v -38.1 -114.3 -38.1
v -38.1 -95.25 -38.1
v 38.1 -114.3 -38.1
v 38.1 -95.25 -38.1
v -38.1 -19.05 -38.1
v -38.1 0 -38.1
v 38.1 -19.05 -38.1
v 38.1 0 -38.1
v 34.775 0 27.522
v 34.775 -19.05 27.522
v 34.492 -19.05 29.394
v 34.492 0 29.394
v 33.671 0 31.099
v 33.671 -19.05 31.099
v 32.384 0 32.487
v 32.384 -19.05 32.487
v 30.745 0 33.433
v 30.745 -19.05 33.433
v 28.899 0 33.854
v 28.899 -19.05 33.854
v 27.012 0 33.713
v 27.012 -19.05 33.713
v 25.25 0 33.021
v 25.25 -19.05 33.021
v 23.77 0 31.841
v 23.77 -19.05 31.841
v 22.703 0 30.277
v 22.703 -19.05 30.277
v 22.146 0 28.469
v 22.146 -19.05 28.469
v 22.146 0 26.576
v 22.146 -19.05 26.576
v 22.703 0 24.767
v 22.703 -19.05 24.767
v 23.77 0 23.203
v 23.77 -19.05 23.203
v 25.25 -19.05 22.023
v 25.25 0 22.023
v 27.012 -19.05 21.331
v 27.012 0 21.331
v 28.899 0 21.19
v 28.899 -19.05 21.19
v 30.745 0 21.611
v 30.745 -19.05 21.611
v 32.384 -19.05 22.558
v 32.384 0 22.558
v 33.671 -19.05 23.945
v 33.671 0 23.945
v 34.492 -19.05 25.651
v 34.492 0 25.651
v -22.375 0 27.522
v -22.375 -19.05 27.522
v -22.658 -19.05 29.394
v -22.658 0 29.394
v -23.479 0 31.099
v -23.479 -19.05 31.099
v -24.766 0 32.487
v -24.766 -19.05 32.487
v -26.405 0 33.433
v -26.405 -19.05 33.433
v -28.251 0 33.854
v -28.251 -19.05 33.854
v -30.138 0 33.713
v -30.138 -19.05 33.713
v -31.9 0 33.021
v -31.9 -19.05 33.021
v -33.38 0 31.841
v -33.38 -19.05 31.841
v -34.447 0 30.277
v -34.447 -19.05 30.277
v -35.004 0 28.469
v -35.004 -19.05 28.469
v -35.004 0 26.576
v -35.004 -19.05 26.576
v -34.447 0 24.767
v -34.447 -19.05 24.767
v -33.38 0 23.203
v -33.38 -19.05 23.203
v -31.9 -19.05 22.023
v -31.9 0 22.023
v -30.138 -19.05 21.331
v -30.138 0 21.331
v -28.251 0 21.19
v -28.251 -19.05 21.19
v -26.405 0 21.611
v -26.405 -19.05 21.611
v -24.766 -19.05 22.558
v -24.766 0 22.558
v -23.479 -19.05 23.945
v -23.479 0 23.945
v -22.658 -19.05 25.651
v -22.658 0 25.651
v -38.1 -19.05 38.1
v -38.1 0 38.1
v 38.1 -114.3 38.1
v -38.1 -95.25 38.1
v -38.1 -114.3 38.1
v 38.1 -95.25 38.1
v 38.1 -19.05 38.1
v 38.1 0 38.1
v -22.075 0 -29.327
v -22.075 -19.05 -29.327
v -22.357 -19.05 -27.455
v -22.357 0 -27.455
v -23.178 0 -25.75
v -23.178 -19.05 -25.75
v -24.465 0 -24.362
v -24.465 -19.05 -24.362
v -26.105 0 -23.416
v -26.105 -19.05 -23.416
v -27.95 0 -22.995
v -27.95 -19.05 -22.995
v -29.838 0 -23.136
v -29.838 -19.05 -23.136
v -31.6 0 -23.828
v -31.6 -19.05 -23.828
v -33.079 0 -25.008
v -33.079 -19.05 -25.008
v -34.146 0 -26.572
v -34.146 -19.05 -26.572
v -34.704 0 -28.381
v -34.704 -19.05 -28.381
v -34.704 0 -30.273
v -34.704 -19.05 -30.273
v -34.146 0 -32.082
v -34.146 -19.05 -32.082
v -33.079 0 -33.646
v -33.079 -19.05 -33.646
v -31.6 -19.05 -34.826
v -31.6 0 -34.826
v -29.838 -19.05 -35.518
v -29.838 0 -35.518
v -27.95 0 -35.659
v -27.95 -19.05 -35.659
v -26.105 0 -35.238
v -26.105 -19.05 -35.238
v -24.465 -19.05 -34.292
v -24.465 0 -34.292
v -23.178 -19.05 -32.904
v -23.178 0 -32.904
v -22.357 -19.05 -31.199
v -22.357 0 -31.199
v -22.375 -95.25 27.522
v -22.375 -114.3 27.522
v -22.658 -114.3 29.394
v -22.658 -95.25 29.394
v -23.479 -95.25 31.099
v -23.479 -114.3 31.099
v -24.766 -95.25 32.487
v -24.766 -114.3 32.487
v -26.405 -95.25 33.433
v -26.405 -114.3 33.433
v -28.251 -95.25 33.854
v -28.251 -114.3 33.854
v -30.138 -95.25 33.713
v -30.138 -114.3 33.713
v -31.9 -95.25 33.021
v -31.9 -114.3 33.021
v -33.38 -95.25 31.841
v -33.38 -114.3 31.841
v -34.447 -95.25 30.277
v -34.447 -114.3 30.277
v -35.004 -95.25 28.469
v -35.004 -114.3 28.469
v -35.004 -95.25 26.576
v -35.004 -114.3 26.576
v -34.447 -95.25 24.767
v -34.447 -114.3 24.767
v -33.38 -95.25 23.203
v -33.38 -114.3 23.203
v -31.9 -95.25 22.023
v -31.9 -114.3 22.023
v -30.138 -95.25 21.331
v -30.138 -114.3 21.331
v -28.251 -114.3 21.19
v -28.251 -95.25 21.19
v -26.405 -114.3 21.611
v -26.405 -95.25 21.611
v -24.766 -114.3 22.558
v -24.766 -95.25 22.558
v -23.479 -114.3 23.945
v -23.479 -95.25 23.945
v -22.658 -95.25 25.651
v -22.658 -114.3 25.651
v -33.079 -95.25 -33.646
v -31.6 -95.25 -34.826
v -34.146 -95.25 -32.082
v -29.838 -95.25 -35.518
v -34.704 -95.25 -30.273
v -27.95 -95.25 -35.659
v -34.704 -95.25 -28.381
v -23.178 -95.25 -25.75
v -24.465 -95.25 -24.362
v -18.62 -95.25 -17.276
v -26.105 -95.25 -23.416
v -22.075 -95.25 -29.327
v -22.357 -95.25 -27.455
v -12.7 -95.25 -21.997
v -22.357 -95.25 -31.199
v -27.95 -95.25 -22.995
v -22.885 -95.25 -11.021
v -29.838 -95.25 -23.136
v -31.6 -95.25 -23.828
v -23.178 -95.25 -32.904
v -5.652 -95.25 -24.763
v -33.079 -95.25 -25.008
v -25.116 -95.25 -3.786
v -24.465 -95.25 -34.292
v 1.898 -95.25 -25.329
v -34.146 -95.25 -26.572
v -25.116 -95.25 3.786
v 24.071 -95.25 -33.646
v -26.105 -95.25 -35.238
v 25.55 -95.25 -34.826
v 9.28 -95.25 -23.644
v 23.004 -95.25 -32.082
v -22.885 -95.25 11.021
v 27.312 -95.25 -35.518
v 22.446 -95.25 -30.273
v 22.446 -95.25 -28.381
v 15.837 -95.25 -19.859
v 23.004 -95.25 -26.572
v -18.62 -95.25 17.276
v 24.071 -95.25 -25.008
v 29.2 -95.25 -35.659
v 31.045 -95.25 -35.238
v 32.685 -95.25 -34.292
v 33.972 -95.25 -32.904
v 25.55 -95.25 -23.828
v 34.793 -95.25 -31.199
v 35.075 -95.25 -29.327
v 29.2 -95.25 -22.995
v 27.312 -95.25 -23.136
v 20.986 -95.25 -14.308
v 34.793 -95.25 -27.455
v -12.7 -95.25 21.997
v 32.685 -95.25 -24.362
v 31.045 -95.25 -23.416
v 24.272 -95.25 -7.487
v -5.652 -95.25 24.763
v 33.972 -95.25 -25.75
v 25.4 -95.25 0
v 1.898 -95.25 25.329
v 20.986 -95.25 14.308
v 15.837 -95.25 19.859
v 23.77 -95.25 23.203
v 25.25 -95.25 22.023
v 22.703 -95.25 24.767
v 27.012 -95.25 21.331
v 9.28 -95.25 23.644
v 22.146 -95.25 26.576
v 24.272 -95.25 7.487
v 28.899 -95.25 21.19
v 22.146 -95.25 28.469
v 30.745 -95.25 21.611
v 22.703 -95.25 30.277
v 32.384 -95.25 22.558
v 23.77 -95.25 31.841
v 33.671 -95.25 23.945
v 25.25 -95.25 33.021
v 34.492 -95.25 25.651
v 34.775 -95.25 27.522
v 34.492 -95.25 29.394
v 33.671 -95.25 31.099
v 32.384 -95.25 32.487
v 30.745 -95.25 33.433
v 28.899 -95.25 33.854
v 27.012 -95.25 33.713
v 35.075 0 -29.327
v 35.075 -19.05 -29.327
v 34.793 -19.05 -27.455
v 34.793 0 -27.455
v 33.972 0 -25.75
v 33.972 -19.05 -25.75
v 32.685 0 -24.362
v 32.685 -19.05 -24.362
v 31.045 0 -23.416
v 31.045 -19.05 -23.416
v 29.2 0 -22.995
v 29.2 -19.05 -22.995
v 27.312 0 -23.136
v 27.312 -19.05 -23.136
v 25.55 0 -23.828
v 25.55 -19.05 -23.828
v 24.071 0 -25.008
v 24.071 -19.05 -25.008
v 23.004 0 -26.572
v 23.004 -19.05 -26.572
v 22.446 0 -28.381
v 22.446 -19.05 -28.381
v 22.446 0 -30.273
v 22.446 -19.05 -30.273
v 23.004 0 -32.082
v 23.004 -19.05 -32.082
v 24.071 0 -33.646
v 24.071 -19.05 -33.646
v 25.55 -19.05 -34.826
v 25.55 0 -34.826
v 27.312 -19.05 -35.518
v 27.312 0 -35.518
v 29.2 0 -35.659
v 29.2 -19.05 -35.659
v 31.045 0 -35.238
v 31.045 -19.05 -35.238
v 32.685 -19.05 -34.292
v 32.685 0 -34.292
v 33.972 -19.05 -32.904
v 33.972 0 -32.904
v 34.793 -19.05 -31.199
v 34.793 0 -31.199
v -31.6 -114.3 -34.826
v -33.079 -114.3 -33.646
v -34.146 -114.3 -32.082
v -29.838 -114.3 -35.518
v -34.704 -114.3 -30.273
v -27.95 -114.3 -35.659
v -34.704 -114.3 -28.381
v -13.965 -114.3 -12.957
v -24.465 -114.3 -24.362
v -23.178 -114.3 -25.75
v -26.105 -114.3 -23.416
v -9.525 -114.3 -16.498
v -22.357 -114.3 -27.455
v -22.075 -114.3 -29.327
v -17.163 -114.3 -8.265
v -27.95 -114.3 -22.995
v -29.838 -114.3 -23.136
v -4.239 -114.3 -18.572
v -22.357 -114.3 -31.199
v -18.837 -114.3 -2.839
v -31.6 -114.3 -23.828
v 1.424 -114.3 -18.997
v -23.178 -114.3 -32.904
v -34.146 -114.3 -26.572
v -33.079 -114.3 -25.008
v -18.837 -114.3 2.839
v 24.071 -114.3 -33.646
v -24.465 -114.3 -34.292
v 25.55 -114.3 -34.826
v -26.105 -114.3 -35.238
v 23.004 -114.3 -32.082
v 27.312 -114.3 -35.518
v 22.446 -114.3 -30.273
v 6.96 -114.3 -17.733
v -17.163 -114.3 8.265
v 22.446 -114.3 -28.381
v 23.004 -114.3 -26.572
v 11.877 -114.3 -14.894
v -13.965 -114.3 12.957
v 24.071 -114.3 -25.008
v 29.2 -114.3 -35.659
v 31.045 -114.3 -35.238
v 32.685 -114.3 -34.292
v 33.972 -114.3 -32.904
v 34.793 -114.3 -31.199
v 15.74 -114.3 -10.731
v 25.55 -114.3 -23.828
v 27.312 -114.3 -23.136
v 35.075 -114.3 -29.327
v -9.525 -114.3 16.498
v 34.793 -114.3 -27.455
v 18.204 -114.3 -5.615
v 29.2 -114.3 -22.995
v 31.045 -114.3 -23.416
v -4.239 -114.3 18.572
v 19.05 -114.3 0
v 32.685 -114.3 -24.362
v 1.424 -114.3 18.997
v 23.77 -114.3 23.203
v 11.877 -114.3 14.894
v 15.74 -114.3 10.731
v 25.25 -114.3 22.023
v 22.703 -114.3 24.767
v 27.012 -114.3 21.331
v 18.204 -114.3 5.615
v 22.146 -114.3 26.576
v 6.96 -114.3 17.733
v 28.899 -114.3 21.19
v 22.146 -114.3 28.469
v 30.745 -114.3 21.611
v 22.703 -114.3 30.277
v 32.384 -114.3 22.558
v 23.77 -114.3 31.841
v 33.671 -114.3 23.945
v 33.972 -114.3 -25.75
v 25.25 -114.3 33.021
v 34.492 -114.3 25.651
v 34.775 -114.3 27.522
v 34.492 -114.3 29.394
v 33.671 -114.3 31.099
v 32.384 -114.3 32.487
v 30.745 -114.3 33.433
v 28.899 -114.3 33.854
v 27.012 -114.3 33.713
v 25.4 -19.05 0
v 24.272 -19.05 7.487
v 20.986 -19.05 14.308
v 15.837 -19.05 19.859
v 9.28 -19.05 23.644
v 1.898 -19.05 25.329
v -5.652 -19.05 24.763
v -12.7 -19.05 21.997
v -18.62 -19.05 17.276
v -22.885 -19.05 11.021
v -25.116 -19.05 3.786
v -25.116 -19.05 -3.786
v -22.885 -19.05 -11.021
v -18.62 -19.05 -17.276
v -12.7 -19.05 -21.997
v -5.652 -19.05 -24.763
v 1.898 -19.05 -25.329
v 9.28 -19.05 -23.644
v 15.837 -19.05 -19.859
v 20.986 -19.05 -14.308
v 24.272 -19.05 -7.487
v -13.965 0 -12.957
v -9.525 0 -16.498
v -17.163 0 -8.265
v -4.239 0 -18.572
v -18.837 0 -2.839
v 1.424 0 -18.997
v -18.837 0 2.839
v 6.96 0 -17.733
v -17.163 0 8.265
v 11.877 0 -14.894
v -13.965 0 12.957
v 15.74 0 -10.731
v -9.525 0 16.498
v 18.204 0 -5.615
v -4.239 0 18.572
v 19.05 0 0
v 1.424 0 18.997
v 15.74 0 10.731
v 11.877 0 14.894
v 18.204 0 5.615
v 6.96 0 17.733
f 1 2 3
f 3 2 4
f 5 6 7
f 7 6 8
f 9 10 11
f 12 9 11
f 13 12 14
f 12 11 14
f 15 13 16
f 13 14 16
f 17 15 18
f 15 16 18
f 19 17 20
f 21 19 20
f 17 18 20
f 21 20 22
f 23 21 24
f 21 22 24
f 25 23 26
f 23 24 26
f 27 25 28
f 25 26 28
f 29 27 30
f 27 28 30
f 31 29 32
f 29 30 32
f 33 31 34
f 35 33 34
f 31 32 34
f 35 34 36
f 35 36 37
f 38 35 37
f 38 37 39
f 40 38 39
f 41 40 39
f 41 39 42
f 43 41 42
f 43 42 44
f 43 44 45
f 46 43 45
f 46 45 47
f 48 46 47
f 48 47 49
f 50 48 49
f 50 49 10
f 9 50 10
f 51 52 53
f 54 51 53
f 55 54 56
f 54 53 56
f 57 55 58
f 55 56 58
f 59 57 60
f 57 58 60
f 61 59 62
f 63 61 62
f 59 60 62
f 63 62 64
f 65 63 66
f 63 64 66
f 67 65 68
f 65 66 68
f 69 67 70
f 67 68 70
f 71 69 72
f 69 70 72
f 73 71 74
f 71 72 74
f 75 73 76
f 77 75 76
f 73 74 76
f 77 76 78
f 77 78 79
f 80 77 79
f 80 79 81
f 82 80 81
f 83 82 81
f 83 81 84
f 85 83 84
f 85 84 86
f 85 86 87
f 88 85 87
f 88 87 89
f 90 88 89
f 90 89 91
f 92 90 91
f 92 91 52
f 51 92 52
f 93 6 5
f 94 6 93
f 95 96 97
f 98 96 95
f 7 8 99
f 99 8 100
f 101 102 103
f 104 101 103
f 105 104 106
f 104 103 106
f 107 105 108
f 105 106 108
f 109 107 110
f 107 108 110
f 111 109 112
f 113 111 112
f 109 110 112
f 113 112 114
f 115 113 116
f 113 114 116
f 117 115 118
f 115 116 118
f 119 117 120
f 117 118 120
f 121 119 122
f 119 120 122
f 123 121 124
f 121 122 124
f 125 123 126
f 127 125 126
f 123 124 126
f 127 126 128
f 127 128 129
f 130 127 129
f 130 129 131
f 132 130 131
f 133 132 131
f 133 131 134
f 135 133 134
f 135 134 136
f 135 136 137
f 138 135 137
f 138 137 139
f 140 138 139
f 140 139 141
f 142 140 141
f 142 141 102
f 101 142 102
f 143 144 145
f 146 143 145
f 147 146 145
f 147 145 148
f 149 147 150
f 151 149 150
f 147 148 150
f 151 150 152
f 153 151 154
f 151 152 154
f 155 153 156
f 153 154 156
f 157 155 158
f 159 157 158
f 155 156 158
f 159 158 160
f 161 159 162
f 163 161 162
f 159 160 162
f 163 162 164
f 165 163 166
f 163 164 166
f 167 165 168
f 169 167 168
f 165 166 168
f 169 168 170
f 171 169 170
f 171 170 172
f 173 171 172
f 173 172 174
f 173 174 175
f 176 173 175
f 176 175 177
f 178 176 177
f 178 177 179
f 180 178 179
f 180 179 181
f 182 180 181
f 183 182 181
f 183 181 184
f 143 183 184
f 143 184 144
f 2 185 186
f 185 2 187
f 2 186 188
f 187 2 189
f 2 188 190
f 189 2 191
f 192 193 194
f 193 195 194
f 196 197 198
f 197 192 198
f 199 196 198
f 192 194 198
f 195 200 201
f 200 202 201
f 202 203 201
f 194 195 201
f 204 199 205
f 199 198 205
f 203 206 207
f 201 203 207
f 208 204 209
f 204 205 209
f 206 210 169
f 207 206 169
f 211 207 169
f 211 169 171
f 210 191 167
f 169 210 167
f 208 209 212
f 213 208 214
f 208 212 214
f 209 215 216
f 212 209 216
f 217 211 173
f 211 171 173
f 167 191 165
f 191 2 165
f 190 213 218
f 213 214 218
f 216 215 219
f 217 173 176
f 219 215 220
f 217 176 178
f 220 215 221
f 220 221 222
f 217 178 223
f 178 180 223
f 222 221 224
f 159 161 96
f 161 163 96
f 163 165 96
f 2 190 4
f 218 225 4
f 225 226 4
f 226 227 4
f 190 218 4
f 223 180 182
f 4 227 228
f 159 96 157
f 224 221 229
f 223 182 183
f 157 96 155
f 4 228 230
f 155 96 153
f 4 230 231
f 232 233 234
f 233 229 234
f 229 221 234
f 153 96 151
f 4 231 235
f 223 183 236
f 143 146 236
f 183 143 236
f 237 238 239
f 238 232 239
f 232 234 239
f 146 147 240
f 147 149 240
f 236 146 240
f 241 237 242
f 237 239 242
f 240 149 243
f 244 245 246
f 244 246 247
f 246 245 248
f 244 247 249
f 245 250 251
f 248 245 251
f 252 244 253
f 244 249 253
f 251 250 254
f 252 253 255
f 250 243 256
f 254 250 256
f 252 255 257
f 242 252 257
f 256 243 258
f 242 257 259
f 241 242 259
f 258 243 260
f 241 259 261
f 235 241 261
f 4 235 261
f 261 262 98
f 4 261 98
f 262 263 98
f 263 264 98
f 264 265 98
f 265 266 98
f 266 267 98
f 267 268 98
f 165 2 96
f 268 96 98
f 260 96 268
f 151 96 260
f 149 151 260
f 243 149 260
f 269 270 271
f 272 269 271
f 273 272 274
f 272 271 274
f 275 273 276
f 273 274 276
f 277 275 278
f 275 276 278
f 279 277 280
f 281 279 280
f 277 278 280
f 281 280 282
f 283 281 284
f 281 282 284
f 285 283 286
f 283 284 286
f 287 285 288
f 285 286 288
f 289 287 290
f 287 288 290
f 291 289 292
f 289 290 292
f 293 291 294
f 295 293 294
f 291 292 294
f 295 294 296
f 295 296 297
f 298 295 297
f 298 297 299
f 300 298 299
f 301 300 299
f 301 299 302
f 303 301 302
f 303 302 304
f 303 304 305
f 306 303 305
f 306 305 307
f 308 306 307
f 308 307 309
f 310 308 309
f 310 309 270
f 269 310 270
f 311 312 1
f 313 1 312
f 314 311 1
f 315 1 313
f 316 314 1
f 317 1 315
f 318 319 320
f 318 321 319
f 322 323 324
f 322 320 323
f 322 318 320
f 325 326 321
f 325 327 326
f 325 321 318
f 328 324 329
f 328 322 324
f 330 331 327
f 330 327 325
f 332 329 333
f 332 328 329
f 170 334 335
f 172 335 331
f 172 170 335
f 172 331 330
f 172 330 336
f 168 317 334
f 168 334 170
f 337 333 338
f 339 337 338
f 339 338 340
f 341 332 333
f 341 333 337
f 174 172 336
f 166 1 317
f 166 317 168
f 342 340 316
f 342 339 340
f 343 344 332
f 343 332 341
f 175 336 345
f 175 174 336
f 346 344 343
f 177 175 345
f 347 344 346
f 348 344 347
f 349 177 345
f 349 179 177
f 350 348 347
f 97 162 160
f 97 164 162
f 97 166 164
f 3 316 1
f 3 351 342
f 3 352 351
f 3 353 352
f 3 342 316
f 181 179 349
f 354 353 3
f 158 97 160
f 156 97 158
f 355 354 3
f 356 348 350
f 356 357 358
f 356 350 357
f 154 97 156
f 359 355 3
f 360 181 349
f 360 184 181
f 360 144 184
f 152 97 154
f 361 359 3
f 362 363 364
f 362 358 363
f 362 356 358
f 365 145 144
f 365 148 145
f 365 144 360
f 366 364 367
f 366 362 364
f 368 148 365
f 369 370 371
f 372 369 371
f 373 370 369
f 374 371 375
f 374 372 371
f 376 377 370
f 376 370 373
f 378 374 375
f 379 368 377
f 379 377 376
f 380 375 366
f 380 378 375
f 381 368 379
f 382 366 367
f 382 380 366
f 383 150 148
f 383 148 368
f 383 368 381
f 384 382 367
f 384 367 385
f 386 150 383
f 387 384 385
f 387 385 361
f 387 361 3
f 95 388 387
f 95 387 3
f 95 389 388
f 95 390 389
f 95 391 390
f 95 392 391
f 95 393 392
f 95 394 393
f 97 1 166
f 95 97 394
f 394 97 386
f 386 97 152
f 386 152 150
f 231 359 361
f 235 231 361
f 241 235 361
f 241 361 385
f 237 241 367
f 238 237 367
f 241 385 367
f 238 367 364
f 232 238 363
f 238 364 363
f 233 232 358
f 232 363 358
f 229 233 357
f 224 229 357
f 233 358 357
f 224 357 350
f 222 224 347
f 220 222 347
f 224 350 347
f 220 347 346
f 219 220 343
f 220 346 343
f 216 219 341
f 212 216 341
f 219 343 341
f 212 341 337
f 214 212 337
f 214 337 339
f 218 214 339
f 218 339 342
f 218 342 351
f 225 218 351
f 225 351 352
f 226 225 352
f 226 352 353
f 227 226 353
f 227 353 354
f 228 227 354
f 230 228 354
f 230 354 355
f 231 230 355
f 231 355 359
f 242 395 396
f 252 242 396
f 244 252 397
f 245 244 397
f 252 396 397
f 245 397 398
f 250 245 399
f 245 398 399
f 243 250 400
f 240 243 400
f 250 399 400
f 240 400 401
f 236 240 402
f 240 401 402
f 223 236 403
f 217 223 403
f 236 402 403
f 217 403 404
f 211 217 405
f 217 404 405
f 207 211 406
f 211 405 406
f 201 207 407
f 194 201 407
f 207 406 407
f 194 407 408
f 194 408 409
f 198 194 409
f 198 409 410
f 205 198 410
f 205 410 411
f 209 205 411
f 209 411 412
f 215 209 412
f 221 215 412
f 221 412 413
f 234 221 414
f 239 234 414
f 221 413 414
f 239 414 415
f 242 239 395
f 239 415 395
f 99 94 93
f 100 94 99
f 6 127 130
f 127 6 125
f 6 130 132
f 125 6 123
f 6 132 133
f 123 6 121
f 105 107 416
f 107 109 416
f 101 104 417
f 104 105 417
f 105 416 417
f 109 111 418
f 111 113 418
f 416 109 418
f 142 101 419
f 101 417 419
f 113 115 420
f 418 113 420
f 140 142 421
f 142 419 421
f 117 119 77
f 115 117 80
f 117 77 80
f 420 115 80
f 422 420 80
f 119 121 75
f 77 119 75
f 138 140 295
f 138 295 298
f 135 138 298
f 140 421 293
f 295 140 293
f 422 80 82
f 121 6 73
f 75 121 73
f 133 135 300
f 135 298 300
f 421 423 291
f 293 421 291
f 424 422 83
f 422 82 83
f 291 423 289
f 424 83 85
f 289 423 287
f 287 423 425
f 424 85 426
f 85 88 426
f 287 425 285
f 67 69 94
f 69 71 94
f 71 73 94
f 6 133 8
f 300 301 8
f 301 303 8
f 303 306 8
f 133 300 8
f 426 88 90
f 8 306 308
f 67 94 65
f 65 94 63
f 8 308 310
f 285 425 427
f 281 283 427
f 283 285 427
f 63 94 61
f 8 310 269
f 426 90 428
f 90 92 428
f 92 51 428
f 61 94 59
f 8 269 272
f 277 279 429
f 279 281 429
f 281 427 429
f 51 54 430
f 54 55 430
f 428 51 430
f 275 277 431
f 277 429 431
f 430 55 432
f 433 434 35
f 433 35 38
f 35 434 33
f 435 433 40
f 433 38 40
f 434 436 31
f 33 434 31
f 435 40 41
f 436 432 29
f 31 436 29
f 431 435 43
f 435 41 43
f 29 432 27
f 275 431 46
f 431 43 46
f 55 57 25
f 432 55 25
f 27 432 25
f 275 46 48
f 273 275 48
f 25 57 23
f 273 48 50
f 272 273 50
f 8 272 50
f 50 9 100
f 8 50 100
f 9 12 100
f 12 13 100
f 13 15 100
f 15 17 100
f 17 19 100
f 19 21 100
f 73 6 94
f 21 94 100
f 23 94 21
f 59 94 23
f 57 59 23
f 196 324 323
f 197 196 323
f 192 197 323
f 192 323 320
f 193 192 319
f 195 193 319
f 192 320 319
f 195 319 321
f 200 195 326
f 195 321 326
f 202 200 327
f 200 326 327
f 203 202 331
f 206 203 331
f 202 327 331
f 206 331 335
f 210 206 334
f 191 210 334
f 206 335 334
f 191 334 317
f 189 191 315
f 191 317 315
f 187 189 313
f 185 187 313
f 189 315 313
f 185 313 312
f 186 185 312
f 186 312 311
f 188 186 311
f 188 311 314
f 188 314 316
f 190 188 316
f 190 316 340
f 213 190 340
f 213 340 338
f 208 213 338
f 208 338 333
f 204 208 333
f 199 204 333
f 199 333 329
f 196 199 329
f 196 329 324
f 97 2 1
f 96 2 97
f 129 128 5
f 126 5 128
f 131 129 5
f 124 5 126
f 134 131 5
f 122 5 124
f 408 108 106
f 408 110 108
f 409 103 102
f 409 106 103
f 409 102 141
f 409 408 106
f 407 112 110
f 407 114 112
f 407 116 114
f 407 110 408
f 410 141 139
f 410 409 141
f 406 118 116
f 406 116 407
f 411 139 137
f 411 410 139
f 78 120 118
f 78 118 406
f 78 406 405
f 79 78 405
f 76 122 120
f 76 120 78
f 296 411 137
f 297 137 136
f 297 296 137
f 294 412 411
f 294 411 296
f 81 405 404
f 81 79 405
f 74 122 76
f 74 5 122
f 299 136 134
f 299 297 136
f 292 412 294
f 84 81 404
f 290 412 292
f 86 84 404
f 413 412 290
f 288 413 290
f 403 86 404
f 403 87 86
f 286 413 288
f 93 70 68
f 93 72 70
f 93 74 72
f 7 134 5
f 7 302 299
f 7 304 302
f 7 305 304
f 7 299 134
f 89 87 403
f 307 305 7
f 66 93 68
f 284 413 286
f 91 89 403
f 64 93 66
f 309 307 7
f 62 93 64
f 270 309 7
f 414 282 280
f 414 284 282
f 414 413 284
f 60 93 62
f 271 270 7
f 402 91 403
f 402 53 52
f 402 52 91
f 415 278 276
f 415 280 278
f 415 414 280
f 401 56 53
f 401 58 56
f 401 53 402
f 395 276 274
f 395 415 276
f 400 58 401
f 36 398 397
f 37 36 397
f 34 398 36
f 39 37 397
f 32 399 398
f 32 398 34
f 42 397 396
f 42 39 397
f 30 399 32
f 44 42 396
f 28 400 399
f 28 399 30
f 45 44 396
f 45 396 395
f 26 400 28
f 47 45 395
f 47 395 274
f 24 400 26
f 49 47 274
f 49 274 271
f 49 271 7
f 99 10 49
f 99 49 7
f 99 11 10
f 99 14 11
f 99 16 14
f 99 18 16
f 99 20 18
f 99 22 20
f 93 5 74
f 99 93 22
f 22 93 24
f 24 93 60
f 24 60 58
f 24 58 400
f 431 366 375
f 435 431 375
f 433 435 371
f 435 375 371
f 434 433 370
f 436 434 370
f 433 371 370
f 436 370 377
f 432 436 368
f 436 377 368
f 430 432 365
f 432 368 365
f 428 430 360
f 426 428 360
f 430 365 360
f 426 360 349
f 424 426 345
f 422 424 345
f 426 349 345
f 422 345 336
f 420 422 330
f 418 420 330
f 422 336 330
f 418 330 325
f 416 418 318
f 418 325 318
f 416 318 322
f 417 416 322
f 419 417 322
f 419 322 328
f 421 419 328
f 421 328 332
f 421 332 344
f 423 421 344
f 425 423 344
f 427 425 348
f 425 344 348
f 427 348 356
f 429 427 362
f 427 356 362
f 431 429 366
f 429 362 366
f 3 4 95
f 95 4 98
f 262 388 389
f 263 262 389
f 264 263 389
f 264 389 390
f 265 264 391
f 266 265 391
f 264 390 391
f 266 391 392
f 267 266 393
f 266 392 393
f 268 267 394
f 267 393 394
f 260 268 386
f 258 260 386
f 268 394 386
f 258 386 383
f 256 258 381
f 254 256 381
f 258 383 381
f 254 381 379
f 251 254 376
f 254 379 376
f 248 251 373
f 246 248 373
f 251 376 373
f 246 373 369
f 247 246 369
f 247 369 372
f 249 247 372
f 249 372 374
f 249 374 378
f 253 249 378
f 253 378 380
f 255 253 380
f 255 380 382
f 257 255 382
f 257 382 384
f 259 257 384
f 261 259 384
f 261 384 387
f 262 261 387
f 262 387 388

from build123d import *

# Parameters (mm, degrees)
F0_W      = 76.2
F0_H      = 76.2
F1_DEPTH  = 19.05
F2_R      = 25.4
F3_DEPTH  = 76.2
F4_W      = 76.2
F4_H      = 76.2
F5_DEPTH  = 19.05
F6_R      = 19.05
F8_DEPTH  = 114.3
F9_R      = 6.35
F10_DEPTH = 114.3


with BuildPart() as f1:
    # F0 (on Front) → F1 (new body)
    with BuildSketch(Plane.XZ):
        Rectangle(F0_W, F0_H)
    extrude(amount=F1_DEPTH)

    # F2 (on face) → F3 (join)
    with BuildSketch(Plane.XZ.offset(19.05)):
        Circle(F2_R)
    extrude(amount=F3_DEPTH)

    # F4 (on face) → F5 (join)
    with BuildSketch(Plane.XZ.offset(95.25)):
        Rectangle(F4_W, F4_H)
    extrude(amount=F5_DEPTH)

    # F6 (on face) → F8 (cut)
    with BuildSketch(Plane.XZ.offset(114.3)):
        Circle(F6_R)
    extrude(amount=-F8_DEPTH, mode=Mode.SUBTRACT)

    # F9 (on face) → F10 (cut)
    with BuildSketch(Plane.XZ.offset(114.3)):
        with Locations((-28.725395, 27.522238)):
            Circle(F9_R)
        with Locations((-28.424606, -29.326973)):
            Circle(F9_R)
        with Locations((28.725393, -29.326973)):
            Circle(F9_R)
        with Locations((28.424604, 27.522238)):
            Circle(F9_R)
    extrude(amount=-F10_DEPTH, mode=Mode.SUBTRACT)


solid = f1.part
